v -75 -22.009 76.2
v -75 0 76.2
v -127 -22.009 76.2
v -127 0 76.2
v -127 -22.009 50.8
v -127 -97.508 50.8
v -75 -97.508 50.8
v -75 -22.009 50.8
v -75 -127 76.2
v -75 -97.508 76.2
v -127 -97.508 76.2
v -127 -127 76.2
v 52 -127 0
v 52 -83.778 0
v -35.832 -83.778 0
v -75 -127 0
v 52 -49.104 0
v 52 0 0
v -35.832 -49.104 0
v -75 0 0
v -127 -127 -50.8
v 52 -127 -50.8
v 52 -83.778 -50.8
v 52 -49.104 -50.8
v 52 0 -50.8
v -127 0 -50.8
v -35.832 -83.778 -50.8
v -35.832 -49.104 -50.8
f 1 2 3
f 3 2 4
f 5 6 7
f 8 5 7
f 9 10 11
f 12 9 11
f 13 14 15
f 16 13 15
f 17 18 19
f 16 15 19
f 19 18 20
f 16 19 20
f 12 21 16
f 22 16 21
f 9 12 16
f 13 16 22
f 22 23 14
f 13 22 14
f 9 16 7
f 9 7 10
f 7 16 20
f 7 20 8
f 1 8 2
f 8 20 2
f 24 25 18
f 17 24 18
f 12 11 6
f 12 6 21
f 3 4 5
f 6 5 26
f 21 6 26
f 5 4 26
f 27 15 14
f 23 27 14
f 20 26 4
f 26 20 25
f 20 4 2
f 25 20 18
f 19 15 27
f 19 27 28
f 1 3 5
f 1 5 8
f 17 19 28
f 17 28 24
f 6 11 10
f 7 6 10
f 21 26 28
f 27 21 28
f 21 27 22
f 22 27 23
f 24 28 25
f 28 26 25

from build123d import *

# Parameters (mm, degrees)
F1_DEPTH = 127
F2_W     = 51.9999986213
F2_H     = 75.4991620779
F3_DEPTH = 25.4
F4_W     = 87.8321913701
F4_H     = 34.6736311913
F5_DEPTH = 77.47


with BuildPart() as f1:
    # F0 (on Front) → F1 (new body)
    with BuildSketch(Plane.XZ):
        Polygon((-75.0000013787, 76.2), (-127, 76.2), (-127, -50.8), (51.9999986213, -50.8), (51.9999986213, 0), (-75.0000013787, 0), align=None)
    extrude(amount=F1_DEPTH)

    # F2 (on face) → F3 (cut)
    with BuildSketch(Plane.XY.offset(76.2)):
        with Locations((-101.0000006893, -59.7584694624)):
            Rectangle(F2_W, F2_H)
    extrude(amount=-F3_DEPTH, mode=Mode.SUBTRACT)

    # F4 (on face) → F5 (cut)
    with BuildSketch(Plane.XY):
        with Locations((8.0839029363, -66.4408057928)):
            Rectangle(F4_W, F4_H)
    extrude(amount=-F5_DEPTH, mode=Mode.SUBTRACT)


solid = f1.part
